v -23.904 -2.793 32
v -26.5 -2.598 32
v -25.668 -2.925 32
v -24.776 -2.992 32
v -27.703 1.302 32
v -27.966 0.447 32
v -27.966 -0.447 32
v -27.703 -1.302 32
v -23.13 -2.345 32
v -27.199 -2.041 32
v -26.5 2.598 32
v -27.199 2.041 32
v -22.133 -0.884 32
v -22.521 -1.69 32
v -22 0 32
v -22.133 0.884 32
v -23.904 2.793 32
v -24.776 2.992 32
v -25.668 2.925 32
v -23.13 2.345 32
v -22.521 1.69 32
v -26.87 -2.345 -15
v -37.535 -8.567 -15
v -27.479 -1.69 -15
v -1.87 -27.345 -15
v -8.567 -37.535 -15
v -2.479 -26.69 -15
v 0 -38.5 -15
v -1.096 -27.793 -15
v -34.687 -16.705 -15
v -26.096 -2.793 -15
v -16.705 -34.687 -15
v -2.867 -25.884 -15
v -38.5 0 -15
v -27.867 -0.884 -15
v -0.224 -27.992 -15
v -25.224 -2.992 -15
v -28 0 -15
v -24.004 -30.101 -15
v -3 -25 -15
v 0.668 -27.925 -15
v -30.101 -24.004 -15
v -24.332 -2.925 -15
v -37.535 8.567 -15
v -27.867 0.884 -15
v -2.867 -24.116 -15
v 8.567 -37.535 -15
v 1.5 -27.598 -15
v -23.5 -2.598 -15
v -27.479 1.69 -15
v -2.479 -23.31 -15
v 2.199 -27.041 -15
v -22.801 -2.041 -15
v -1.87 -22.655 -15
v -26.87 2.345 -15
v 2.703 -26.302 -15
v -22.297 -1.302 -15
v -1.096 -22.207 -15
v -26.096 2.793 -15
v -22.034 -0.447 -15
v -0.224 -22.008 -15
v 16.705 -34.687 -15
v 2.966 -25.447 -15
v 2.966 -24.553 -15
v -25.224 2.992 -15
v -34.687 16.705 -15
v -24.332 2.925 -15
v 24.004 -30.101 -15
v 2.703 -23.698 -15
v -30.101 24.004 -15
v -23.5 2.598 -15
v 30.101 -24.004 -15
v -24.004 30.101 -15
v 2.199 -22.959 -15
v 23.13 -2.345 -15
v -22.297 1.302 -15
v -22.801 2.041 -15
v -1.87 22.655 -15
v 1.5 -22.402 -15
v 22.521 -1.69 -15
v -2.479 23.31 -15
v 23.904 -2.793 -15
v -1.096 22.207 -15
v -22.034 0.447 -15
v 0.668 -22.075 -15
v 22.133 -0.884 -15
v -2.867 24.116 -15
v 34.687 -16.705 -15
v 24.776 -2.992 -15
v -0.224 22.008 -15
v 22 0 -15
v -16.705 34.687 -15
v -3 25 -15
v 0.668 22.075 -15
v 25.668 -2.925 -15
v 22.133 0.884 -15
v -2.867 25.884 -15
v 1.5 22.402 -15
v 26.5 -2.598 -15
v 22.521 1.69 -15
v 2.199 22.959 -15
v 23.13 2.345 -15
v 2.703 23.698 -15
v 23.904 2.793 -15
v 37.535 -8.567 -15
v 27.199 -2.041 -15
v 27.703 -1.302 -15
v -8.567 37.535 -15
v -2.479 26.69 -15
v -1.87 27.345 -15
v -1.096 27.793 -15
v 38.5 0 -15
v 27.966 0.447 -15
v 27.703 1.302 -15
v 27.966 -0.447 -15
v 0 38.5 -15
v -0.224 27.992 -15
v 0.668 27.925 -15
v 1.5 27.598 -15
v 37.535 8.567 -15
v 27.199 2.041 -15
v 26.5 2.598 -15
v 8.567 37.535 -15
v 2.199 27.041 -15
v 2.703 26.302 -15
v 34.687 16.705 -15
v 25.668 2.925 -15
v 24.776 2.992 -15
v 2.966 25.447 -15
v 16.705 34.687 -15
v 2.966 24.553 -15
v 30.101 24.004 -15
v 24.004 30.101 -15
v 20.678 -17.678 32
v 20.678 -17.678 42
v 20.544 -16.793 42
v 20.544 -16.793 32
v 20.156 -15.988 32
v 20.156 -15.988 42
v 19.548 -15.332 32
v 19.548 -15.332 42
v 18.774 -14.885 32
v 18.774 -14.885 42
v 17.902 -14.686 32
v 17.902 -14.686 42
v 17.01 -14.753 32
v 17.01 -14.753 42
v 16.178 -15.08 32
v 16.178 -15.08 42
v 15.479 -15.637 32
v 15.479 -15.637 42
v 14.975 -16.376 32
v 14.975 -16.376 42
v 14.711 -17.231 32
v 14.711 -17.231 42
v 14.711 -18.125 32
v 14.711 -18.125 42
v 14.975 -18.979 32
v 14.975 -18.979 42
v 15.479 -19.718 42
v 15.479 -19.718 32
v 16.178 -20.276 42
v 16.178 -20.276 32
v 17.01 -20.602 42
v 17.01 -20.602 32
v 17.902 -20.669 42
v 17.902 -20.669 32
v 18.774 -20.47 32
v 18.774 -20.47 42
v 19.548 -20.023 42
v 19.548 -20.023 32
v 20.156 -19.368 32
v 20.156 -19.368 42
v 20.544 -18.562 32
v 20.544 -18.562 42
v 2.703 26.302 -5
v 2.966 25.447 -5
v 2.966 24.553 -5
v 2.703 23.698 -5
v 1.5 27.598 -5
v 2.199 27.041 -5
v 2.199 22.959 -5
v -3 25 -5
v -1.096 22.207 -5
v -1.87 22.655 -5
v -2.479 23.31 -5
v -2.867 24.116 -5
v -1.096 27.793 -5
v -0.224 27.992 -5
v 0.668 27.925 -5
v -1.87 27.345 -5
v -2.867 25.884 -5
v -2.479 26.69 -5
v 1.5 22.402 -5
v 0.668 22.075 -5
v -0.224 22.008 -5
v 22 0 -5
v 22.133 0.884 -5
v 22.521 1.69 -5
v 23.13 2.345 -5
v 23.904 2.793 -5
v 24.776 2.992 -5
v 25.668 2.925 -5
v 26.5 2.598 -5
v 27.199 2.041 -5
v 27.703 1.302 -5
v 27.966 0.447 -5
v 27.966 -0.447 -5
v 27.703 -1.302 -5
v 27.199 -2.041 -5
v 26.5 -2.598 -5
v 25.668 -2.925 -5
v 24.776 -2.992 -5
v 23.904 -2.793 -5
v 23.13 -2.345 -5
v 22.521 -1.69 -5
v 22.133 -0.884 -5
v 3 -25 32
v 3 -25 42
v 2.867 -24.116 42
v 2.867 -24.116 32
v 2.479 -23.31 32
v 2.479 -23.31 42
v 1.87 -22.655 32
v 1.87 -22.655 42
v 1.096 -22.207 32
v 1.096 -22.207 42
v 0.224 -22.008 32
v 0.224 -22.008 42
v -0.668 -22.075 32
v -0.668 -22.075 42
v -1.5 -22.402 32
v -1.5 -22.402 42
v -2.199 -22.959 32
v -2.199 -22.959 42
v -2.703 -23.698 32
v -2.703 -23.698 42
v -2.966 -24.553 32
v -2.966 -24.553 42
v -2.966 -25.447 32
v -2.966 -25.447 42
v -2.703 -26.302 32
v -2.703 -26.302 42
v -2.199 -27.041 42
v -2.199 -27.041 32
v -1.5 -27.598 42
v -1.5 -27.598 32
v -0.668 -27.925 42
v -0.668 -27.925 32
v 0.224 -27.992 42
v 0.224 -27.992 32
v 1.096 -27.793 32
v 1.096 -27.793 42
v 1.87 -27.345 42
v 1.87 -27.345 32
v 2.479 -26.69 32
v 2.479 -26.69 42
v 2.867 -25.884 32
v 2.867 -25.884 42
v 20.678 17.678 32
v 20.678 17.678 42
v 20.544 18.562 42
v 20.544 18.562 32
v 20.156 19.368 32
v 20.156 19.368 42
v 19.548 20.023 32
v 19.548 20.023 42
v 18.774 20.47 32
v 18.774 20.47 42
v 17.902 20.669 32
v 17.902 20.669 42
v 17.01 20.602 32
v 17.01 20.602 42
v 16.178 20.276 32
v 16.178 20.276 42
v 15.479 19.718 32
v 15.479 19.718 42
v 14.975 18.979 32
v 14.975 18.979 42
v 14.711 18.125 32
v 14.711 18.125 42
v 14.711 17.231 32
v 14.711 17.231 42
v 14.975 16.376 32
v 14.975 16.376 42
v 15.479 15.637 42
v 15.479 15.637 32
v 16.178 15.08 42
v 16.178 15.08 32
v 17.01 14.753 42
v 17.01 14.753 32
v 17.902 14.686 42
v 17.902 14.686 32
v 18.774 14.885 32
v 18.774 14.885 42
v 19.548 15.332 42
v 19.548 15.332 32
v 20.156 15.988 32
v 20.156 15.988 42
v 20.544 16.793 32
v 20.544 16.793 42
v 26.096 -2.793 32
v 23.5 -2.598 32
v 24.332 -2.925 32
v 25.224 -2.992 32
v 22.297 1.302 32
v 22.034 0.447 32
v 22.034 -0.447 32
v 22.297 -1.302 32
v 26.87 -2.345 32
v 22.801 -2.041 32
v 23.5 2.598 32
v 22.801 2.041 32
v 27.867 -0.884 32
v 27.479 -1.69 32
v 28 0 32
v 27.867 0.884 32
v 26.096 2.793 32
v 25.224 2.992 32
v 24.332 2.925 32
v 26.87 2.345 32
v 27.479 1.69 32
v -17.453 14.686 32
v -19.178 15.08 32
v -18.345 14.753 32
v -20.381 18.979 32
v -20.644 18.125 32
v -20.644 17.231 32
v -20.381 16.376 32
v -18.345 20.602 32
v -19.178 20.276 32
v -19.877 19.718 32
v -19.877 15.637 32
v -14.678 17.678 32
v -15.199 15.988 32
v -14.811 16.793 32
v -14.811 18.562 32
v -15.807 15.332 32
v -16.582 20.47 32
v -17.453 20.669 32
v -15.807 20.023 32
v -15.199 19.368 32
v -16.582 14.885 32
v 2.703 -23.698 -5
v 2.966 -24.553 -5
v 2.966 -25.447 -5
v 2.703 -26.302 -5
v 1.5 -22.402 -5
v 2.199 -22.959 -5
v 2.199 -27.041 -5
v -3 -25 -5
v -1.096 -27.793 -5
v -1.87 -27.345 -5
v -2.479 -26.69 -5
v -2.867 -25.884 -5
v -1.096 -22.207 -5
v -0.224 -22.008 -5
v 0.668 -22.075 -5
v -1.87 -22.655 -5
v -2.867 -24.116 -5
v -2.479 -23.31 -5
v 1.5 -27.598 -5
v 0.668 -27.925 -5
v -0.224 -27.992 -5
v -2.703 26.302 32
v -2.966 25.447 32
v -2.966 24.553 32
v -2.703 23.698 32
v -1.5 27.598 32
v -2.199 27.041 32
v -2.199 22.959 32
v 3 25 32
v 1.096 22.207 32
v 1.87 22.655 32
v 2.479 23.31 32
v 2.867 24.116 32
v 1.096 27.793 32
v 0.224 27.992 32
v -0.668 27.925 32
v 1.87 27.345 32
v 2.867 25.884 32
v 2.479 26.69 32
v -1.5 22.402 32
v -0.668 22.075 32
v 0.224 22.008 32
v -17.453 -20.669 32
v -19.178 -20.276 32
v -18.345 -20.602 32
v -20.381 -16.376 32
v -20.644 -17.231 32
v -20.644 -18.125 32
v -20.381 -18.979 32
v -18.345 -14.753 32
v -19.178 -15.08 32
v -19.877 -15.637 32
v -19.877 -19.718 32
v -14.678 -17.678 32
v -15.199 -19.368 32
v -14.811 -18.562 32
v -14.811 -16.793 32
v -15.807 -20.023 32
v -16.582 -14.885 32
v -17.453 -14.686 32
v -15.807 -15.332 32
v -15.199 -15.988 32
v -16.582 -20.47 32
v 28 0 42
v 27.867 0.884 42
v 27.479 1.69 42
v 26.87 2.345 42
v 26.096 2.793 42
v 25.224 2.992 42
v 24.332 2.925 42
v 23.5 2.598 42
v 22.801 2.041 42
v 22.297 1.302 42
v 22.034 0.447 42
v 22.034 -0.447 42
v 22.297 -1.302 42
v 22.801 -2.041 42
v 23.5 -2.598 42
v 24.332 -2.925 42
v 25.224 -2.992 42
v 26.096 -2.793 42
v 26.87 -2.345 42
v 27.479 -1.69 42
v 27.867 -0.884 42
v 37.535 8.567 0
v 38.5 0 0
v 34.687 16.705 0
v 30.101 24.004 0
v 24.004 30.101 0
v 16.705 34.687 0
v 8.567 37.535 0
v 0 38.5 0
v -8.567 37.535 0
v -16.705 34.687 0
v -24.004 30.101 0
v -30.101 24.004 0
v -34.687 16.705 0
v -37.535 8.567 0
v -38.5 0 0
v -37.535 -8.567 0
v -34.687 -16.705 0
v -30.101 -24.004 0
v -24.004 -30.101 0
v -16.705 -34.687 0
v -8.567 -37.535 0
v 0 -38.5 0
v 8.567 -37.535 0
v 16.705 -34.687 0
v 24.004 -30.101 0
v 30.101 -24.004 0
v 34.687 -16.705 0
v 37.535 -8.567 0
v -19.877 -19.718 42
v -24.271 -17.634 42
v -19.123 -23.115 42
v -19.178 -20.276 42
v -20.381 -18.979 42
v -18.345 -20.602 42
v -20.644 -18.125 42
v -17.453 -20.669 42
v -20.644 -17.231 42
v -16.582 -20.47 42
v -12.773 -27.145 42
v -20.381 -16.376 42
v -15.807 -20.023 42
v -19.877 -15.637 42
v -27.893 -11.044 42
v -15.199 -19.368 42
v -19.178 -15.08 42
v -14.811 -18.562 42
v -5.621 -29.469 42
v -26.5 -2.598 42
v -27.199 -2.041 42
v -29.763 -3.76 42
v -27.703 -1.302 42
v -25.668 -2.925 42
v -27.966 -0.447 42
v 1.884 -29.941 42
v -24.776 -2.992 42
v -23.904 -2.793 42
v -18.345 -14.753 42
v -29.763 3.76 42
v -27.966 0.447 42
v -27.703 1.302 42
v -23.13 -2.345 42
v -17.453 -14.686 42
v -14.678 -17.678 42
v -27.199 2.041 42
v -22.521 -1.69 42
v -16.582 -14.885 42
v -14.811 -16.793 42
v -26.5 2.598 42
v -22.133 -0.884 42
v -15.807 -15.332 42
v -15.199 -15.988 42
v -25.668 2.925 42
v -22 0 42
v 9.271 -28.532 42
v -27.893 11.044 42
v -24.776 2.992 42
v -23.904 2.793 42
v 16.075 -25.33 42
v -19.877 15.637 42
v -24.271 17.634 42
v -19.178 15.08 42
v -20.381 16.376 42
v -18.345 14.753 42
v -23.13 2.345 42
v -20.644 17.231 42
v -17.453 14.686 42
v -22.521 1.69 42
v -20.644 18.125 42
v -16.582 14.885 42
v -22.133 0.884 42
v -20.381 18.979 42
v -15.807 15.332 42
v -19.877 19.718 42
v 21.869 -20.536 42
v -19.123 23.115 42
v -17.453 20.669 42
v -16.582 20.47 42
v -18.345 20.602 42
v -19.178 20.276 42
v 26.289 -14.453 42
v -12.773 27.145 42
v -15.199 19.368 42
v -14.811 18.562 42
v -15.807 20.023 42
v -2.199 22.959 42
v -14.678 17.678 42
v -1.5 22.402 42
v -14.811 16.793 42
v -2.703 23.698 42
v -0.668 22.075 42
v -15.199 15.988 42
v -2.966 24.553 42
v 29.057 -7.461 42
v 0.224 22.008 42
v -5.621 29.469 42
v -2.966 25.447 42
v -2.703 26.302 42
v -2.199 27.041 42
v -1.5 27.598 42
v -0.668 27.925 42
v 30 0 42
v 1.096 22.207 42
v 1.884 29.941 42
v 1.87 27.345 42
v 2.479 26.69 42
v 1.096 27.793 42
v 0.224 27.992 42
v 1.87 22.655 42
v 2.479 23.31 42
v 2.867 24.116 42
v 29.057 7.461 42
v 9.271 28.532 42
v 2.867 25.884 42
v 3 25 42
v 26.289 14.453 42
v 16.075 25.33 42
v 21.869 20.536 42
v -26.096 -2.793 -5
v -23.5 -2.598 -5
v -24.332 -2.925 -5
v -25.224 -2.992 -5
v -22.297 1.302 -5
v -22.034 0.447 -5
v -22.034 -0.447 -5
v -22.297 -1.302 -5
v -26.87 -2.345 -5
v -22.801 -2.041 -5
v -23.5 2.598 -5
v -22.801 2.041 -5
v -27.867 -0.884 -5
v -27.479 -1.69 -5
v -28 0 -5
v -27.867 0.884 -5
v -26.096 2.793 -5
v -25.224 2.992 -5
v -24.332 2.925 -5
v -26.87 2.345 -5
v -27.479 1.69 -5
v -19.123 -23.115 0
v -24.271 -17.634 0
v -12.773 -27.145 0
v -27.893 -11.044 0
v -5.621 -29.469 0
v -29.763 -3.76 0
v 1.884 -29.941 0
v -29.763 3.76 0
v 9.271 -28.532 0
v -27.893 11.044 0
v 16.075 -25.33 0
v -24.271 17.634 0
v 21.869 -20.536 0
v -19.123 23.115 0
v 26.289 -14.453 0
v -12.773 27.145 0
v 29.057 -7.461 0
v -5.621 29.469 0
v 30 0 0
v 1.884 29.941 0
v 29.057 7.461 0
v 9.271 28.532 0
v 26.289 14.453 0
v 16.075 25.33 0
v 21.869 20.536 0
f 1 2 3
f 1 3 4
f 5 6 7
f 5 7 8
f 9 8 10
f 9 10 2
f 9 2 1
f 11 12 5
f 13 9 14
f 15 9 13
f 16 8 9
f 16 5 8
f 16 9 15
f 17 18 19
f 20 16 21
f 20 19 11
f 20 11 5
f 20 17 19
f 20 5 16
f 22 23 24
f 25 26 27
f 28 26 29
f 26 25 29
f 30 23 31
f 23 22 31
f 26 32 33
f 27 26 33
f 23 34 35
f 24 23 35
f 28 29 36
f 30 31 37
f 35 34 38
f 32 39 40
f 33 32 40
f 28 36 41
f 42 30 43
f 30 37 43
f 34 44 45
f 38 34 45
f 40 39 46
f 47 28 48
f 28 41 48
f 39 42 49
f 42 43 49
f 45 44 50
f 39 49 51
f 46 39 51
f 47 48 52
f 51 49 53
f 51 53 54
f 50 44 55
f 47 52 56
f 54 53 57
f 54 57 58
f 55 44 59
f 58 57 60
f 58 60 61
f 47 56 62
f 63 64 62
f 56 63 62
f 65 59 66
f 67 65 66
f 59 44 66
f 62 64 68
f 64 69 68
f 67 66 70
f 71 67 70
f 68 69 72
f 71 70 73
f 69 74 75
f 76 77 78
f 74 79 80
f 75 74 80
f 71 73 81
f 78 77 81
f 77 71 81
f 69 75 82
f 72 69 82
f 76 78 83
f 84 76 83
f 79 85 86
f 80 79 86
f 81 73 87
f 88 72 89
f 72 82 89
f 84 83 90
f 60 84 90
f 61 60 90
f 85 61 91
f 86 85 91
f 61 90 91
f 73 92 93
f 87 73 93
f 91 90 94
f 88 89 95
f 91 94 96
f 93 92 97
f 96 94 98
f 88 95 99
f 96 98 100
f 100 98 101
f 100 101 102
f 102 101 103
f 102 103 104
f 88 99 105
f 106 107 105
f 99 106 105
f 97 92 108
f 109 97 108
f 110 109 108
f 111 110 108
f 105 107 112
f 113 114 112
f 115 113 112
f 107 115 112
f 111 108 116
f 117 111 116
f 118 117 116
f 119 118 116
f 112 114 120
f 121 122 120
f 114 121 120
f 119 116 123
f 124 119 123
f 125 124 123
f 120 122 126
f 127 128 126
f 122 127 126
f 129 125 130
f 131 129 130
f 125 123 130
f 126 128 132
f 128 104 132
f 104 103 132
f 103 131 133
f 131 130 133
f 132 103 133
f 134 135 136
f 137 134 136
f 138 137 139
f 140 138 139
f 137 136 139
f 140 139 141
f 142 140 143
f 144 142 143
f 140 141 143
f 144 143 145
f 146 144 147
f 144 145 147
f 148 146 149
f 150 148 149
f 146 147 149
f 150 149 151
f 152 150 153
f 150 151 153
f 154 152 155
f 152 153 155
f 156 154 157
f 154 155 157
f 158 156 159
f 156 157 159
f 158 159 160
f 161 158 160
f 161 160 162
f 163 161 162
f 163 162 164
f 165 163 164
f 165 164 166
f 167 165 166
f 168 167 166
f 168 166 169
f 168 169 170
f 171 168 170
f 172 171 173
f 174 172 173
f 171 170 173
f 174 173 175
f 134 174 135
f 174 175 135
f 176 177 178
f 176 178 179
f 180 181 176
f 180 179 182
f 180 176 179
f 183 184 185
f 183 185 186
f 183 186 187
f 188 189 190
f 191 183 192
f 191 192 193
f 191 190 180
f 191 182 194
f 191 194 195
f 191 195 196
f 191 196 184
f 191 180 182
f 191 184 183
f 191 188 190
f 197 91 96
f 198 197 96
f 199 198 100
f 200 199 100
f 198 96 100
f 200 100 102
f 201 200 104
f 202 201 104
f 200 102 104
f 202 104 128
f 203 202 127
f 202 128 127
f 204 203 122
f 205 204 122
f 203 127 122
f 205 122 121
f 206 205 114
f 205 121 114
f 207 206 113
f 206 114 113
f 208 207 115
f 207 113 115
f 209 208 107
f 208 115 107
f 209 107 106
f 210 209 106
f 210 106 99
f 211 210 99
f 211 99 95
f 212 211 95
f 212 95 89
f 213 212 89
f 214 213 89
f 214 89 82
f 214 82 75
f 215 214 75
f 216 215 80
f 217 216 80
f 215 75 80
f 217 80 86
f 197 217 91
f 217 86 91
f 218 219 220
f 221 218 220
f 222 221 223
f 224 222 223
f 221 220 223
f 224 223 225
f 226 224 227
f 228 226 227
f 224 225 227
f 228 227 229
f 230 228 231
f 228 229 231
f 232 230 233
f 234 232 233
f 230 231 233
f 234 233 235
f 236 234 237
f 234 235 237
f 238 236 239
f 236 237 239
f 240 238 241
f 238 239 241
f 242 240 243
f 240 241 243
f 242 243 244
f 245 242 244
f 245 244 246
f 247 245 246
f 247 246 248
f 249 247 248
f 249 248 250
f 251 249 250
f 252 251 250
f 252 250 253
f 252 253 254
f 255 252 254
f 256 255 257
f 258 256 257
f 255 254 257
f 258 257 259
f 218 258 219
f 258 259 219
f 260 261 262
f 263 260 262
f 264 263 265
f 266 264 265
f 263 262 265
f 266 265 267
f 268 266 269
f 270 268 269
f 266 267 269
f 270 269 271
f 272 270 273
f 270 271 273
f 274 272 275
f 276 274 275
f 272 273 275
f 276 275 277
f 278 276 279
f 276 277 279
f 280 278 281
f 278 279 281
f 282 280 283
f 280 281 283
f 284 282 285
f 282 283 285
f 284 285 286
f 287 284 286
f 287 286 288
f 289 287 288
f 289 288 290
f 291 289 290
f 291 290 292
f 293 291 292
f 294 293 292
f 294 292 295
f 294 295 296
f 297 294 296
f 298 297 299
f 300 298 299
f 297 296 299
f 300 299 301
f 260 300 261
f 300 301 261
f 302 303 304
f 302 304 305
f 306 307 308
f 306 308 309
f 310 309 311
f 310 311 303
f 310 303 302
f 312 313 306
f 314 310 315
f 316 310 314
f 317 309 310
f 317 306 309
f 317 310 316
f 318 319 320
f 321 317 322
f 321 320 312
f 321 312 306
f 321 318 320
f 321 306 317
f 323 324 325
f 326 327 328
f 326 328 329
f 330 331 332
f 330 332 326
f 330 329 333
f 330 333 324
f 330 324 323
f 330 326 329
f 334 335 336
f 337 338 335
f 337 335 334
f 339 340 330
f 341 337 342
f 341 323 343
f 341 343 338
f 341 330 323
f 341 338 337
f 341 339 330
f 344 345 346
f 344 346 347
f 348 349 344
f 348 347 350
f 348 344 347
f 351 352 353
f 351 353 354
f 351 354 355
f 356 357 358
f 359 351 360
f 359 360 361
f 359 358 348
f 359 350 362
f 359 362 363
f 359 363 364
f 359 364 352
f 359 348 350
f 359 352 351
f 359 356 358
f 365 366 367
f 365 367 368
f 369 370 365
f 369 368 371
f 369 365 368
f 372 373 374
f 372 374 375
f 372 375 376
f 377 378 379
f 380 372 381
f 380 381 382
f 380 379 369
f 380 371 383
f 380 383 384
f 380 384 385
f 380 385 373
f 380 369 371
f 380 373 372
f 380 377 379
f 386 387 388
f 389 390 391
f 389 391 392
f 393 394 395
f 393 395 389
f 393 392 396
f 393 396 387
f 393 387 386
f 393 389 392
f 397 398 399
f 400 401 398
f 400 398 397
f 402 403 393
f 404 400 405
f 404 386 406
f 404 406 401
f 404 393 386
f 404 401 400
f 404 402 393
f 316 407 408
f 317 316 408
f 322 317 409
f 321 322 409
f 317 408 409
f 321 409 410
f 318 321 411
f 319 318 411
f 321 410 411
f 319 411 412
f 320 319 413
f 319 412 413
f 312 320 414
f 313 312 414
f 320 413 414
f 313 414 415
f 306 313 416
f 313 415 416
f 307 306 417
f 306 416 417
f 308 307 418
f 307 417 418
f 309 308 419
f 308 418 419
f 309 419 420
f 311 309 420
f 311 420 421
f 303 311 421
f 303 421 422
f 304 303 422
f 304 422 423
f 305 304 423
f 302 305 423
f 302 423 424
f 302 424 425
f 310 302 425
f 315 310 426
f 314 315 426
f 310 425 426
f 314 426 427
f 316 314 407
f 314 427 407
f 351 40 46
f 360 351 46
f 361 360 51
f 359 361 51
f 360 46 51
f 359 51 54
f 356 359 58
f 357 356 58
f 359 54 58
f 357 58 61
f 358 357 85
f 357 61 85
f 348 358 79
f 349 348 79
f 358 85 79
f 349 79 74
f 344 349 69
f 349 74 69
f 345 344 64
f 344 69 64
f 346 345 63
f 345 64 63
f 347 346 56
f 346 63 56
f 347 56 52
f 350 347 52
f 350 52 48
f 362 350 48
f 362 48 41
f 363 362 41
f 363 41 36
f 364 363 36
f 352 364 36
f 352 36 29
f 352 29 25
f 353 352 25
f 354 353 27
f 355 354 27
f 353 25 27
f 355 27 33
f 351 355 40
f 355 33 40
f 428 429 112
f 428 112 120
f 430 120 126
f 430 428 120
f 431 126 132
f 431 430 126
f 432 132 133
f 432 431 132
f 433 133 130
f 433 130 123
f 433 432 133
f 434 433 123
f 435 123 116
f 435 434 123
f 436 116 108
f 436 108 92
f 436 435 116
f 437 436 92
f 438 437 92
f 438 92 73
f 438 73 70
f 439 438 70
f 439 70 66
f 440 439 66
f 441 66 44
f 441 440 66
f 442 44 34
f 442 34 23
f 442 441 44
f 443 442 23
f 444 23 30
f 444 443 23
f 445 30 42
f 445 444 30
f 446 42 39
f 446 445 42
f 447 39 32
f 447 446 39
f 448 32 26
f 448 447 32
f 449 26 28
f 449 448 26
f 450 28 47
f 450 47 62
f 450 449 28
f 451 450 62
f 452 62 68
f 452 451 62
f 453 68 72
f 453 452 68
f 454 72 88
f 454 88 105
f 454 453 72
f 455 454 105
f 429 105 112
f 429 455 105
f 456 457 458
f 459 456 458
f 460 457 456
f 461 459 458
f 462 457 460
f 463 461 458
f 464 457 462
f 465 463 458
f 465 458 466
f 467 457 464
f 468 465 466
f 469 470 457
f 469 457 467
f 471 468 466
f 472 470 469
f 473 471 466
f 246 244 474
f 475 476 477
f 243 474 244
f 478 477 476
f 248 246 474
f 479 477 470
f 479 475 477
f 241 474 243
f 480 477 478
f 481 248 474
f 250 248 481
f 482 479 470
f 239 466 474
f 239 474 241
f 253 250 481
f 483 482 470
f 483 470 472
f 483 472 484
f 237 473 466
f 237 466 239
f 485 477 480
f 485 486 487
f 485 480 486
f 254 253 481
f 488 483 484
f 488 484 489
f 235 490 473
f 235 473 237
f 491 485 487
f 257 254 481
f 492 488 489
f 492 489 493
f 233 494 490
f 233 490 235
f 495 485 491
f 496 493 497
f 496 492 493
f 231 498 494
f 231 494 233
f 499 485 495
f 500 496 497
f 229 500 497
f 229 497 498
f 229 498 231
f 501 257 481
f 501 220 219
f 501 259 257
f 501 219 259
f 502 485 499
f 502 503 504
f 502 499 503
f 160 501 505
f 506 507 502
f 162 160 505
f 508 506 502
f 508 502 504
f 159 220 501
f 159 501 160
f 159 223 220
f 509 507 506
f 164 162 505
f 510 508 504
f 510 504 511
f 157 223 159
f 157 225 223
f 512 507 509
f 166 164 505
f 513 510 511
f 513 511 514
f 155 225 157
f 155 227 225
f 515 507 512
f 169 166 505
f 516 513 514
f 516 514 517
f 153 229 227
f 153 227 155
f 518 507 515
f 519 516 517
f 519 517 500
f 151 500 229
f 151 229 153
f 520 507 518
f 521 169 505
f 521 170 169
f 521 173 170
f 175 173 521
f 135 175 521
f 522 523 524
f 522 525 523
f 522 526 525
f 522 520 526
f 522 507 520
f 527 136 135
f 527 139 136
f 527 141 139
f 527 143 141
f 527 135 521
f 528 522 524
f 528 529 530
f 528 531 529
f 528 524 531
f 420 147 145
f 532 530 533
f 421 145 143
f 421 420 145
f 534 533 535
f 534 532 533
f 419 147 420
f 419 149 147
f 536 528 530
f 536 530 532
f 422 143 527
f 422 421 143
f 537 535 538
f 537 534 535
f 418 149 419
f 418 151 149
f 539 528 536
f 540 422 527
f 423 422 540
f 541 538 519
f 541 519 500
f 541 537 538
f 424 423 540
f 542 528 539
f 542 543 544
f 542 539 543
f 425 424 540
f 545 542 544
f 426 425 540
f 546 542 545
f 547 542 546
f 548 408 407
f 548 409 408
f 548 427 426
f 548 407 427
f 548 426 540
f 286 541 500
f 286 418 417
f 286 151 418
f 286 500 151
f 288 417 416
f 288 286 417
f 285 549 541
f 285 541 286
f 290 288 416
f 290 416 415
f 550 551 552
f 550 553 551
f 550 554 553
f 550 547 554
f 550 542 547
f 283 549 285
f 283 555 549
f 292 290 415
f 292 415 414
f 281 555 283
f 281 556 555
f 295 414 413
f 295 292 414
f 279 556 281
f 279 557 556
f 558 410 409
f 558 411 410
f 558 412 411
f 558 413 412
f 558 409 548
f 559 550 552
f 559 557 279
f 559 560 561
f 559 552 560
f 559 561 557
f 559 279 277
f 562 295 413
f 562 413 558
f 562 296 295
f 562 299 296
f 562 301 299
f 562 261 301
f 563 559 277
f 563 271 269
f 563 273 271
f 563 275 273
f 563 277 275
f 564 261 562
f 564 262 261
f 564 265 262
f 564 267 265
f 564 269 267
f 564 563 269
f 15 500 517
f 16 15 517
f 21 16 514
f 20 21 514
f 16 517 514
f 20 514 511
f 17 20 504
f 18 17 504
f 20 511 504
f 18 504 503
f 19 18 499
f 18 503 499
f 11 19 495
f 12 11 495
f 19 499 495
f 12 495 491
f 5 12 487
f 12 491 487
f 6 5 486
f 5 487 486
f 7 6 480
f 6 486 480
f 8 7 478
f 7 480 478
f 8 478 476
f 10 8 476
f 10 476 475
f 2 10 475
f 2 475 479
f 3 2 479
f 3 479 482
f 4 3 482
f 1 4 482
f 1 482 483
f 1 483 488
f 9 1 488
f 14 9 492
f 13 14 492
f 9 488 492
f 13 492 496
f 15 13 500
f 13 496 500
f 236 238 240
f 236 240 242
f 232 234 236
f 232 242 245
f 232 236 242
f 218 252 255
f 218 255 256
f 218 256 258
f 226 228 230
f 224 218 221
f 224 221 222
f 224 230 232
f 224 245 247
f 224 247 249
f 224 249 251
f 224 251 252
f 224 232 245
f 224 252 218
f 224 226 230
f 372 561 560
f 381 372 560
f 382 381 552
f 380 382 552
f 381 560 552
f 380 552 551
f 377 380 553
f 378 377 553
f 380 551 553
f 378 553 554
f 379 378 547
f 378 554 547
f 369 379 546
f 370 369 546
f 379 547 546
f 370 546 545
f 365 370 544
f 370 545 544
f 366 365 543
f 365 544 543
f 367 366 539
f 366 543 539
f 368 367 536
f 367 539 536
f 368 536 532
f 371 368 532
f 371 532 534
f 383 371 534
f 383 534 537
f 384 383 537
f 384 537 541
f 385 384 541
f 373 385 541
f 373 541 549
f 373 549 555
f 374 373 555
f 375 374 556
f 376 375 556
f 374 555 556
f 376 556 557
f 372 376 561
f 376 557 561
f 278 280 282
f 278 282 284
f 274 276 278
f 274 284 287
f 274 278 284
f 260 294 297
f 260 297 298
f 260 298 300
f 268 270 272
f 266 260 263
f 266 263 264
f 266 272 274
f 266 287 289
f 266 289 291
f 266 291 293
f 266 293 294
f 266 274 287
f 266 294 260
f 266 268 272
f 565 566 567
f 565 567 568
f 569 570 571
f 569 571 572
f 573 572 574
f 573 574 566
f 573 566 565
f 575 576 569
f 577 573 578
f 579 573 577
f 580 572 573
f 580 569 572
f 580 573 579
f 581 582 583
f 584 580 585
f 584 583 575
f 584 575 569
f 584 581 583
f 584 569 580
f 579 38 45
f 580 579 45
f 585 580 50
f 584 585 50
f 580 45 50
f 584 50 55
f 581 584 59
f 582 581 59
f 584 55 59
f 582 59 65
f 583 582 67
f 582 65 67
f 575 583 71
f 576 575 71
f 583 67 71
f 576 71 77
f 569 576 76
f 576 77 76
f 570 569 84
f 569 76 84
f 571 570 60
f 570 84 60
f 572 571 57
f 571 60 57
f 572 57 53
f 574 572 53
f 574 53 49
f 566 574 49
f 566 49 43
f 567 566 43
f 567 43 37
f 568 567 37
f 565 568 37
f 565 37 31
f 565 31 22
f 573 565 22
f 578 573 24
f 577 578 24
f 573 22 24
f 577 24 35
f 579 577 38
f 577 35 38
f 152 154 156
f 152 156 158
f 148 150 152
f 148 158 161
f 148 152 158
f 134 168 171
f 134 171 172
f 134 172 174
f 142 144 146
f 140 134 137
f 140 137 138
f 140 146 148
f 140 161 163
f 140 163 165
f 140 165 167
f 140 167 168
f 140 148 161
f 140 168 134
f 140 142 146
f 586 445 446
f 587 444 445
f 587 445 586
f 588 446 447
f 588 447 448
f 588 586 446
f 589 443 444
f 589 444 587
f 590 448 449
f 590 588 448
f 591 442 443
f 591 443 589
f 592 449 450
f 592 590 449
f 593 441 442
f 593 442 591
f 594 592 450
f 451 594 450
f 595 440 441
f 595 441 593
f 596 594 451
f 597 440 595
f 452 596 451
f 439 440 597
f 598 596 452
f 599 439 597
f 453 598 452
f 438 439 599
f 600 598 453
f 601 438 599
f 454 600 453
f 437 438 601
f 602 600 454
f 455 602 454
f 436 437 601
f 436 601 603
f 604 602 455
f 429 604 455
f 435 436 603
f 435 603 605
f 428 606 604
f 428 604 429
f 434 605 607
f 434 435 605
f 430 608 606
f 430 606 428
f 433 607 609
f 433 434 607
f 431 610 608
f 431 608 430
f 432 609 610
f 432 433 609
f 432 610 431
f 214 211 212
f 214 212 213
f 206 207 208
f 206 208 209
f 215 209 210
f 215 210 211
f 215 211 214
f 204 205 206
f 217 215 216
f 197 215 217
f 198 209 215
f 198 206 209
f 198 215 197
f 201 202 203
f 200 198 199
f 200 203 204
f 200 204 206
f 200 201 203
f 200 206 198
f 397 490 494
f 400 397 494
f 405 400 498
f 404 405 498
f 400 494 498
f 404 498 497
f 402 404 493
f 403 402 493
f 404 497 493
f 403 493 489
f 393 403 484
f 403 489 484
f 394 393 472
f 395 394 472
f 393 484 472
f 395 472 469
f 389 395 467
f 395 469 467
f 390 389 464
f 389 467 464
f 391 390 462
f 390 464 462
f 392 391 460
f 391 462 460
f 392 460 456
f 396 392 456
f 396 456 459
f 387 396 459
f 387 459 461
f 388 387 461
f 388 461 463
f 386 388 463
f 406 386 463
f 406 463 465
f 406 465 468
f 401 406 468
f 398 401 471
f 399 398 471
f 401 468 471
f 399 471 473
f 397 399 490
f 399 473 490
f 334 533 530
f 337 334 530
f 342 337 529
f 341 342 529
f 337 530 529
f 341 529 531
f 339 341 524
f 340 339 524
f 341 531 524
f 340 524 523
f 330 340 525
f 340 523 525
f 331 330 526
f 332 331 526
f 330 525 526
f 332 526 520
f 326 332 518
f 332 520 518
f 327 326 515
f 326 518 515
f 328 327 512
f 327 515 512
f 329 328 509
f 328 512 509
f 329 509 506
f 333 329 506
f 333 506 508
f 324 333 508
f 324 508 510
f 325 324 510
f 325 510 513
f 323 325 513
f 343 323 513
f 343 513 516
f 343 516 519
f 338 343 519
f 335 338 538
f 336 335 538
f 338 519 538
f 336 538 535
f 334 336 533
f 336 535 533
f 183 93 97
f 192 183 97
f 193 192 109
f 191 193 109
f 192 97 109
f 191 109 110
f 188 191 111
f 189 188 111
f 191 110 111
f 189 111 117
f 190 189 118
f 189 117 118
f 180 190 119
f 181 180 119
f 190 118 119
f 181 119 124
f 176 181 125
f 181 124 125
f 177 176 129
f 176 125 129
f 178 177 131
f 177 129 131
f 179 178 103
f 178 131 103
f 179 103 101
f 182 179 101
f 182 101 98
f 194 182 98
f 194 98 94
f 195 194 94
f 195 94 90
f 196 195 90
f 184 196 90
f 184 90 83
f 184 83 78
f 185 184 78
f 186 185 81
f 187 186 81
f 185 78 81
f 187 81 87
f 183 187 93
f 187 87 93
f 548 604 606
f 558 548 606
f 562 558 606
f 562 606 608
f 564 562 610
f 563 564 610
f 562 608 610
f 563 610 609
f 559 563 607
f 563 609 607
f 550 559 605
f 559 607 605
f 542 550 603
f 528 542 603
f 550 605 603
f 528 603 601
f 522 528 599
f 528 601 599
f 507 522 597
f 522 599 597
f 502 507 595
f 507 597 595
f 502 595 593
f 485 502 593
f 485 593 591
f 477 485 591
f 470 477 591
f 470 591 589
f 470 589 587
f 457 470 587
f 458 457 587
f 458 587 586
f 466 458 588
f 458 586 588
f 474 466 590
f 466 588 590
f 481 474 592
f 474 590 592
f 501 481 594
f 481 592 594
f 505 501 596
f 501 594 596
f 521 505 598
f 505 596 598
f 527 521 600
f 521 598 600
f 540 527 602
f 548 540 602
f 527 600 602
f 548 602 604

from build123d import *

# Parameters (mm, degrees)
SKETCH2_R           = 30
BOSS_EXTRUDE1_DEPTH = 42
SKETCH2_4_R         = 38.5
BOSS_EXTRUDE2_DEPTH = 15
SKETCH3_R           = 3
CUT_EXTRUDE1_DEPTH  = 10
CUT_EXTRUDE2_START  = -10
SKETCH4_R           = 3
CUT_EXTRUDE2_DEPTH  = 10


with BuildPart() as part:
    # Sketch2 → Boss-Extrude1 (new body)
    with BuildSketch(Plane.XY):
        Circle(SKETCH2_R)
    extrude(amount=BOSS_EXTRUDE1_DEPTH)

    # Sketch2<4> → Boss-Extrude2 (add)
    with BuildSketch(Plane.XY):
        Circle(SKETCH2_4_R)
    extrude(amount=-BOSS_EXTRUDE2_DEPTH)

    # Sketch3 → Cut-Extrude1 (cut)
    with BuildSketch(Plane(origin=(0, 0, -15), x_dir=(-1, 0, 0), z_dir=(0, 0, -1))):
        with Locations((0, 25)):
            Circle(SKETCH3_R)
        with Locations((25, 0)):
            Circle(SKETCH3_R)
        with Locations((0, -25)):
            Circle(SKETCH3_R)
        with Locations((-25, 0)):
            Circle(SKETCH3_R)
    extrude(amount=-CUT_EXTRUDE1_DEPTH, mode=Mode.SUBTRACT)

    # Sketch4 → Cut-Extrude2 (cut)
    with BuildSketch(Plane.XY.offset(42).offset(CUT_EXTRUDE2_START)):
        with Locations((0, 25)):
            Circle(SKETCH4_R)
        with Locations((17.67766953, 17.67766953)):
            Circle(SKETCH4_R)
        with Locations((25, 0)):
            Circle(SKETCH4_R)
        with Locations((17.67766953, -17.67766953)):
            Circle(SKETCH4_R)
        with Locations((0, -25)):
            Circle(SKETCH4_R)
        with Locations((-17.67766953, -17.67766953)):
            Circle(SKETCH4_R)
        with Locations((-25, 0)):
            Circle(SKETCH4_R)
        with Locations((-17.67766953, 17.67766953)):
            Circle(SKETCH4_R)
    extrude(amount=CUT_EXTRUDE2_DEPTH, mode=Mode.SUBTRACT)


solid = part.part
